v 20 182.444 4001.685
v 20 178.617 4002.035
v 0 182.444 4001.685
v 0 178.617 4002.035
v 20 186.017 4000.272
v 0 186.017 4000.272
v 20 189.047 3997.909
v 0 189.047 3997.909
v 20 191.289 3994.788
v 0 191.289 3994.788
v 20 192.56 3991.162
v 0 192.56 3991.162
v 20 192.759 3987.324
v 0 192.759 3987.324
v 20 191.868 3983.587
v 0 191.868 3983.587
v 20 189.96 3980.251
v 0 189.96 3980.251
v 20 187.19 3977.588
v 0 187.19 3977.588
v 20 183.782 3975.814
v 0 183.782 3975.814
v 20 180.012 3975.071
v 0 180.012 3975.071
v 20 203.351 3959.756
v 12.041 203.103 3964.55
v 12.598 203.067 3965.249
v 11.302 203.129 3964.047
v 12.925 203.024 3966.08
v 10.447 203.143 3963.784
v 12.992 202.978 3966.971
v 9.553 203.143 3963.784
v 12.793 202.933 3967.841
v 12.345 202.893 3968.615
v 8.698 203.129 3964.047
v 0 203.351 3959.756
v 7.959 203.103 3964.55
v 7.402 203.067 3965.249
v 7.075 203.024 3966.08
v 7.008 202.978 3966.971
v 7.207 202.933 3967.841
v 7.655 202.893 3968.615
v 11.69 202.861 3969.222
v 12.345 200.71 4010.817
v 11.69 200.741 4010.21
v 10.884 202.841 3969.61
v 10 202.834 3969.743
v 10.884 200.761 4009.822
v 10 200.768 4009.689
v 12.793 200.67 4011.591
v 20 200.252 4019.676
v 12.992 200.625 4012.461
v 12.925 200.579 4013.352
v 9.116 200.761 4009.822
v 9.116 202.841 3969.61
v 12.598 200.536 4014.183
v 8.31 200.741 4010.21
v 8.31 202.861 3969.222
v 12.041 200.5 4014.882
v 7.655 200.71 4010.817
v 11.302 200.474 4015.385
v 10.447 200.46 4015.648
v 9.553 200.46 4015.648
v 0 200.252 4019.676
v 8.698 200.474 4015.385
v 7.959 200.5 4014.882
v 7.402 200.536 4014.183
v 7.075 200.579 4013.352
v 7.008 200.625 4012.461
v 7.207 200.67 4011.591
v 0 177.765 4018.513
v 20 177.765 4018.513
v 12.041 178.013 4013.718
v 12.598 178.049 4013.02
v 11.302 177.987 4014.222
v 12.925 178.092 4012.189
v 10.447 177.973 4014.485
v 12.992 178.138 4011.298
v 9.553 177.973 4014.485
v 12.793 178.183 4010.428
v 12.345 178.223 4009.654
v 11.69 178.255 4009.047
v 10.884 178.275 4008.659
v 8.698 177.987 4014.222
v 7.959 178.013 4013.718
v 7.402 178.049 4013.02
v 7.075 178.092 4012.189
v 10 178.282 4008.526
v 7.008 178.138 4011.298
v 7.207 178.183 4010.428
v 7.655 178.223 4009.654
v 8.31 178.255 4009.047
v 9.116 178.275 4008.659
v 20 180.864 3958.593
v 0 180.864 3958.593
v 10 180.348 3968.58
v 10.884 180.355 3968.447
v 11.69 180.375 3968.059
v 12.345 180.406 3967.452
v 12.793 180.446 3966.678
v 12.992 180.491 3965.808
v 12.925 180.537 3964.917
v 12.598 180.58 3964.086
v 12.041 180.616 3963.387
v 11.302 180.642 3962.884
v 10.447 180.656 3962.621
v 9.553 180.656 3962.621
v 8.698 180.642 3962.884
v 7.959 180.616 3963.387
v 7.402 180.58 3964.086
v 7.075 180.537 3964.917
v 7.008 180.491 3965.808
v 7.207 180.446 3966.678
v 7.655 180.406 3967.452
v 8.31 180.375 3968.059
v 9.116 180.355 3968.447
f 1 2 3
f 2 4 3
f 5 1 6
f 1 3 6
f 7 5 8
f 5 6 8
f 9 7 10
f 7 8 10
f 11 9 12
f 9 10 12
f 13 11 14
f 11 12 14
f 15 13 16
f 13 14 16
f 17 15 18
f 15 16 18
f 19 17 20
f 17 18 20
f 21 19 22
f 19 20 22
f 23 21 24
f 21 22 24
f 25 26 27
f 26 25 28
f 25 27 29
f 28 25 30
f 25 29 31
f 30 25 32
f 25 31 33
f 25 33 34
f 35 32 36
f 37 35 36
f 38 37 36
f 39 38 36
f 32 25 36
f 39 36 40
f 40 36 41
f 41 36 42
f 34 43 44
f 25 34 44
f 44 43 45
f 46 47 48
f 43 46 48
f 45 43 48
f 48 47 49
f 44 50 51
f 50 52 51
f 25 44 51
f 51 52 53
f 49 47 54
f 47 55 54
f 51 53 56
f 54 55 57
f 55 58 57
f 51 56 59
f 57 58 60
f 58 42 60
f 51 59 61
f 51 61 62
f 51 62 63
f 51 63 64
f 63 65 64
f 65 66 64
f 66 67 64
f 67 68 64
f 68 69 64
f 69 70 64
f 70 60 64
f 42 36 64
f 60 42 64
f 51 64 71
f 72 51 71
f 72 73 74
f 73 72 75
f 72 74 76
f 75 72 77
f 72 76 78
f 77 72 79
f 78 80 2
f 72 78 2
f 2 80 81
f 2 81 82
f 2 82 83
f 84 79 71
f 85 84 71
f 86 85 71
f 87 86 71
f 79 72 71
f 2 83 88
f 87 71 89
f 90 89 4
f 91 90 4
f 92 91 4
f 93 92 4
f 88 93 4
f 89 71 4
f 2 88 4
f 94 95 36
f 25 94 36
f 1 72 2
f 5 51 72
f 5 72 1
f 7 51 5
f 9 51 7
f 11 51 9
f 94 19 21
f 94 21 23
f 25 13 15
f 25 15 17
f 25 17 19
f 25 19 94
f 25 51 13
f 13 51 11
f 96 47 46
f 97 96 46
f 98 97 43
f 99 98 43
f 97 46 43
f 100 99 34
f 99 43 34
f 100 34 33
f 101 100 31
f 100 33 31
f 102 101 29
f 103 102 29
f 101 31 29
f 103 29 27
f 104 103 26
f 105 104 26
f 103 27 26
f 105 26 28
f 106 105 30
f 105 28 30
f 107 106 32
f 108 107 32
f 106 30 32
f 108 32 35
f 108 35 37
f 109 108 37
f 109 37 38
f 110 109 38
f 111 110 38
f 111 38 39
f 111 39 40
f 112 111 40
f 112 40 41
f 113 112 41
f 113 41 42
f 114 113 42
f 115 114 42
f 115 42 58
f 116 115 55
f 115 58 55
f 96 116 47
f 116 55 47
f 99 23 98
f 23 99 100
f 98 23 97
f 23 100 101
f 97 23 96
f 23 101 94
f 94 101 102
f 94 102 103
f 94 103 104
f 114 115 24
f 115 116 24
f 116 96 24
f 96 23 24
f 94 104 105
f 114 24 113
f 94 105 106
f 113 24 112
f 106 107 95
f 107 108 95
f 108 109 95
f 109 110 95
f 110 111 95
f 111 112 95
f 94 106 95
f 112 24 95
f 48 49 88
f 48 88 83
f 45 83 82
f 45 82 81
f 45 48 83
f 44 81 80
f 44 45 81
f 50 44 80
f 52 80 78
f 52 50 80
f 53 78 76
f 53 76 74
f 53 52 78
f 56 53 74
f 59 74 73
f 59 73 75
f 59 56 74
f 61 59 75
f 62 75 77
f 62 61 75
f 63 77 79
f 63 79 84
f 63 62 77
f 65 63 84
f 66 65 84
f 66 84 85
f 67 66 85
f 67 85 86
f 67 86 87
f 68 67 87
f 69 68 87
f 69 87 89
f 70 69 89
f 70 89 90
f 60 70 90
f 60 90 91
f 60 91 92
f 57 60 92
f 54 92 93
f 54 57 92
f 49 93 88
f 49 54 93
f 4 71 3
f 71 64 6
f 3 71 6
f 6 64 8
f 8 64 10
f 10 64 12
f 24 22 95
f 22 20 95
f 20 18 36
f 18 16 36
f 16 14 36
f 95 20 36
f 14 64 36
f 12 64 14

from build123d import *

# Parameters (mm, degrees)
EXTRUDE_1_DEPTH     = 20
SKETCH_3_R          = 13.5
CUT_EXTRUDE_1_DEPTH = 20
SKETCH_4_R          = 3
CUT_EXTRUDE_2_DEPTH = 22.516585743


# Read off the part's stored shape, not the designer's step: 填料-伸長1
with BuildPart() as part:
    # 填料-伸長1 outline → 填料-伸長1 (new body)
    with BuildSketch(Plane(origin=(0, 0, 0), x_dir=(0, 0, -1), z_dir=(1, 0, 0))):
        Polygon((-4019.675958787, 200.25160655), (-4018.512862627, 177.765080788), (-3958.59296353, 180.864385914), (-3959.75605969, 203.350911676), align=None)
    extrude(amount=EXTRUDE_1_DEPTH)

    # 草圖3 → 除料-伸長1 (cut)
    with BuildSketch(Plane.ZY):
        with Locations((3988.552913079, 179.314733351)):
            Circle(SKETCH_3_R)
    extrude(amount=-CUT_EXTRUDE_1_DEPTH, mode=Mode.SUBTRACT)

    # 草圖4 → 除料-伸長2 (cut)
    with BuildSketch(Plane(origin=(0, 407.076792548, 21.055696166), x_dir=(1, 0, 0), z_dir=(0, 0.9986649849421085, 0.051655085428040495))):
        with Locations(Location((10, -3950.965617011, 0), (0, 0, 270))):
            Circle(SKETCH_4_R)
    cut_extrude_2 = extrude(amount=-CUT_EXTRUDE_2_DEPTH, mode=Mode.SUBTRACT)

    # 鏡射1: 除料-伸長2 across plane
    add(cut_extrude_2.mirror(Plane(origin=(0, -205.275533435, 3968.660313072), x_dir=(1, 0, 0), z_dir=(0, 0.05165508542804326, -0.9986649849421085))), mode=Mode.SUBTRACT)


solid = part.part
